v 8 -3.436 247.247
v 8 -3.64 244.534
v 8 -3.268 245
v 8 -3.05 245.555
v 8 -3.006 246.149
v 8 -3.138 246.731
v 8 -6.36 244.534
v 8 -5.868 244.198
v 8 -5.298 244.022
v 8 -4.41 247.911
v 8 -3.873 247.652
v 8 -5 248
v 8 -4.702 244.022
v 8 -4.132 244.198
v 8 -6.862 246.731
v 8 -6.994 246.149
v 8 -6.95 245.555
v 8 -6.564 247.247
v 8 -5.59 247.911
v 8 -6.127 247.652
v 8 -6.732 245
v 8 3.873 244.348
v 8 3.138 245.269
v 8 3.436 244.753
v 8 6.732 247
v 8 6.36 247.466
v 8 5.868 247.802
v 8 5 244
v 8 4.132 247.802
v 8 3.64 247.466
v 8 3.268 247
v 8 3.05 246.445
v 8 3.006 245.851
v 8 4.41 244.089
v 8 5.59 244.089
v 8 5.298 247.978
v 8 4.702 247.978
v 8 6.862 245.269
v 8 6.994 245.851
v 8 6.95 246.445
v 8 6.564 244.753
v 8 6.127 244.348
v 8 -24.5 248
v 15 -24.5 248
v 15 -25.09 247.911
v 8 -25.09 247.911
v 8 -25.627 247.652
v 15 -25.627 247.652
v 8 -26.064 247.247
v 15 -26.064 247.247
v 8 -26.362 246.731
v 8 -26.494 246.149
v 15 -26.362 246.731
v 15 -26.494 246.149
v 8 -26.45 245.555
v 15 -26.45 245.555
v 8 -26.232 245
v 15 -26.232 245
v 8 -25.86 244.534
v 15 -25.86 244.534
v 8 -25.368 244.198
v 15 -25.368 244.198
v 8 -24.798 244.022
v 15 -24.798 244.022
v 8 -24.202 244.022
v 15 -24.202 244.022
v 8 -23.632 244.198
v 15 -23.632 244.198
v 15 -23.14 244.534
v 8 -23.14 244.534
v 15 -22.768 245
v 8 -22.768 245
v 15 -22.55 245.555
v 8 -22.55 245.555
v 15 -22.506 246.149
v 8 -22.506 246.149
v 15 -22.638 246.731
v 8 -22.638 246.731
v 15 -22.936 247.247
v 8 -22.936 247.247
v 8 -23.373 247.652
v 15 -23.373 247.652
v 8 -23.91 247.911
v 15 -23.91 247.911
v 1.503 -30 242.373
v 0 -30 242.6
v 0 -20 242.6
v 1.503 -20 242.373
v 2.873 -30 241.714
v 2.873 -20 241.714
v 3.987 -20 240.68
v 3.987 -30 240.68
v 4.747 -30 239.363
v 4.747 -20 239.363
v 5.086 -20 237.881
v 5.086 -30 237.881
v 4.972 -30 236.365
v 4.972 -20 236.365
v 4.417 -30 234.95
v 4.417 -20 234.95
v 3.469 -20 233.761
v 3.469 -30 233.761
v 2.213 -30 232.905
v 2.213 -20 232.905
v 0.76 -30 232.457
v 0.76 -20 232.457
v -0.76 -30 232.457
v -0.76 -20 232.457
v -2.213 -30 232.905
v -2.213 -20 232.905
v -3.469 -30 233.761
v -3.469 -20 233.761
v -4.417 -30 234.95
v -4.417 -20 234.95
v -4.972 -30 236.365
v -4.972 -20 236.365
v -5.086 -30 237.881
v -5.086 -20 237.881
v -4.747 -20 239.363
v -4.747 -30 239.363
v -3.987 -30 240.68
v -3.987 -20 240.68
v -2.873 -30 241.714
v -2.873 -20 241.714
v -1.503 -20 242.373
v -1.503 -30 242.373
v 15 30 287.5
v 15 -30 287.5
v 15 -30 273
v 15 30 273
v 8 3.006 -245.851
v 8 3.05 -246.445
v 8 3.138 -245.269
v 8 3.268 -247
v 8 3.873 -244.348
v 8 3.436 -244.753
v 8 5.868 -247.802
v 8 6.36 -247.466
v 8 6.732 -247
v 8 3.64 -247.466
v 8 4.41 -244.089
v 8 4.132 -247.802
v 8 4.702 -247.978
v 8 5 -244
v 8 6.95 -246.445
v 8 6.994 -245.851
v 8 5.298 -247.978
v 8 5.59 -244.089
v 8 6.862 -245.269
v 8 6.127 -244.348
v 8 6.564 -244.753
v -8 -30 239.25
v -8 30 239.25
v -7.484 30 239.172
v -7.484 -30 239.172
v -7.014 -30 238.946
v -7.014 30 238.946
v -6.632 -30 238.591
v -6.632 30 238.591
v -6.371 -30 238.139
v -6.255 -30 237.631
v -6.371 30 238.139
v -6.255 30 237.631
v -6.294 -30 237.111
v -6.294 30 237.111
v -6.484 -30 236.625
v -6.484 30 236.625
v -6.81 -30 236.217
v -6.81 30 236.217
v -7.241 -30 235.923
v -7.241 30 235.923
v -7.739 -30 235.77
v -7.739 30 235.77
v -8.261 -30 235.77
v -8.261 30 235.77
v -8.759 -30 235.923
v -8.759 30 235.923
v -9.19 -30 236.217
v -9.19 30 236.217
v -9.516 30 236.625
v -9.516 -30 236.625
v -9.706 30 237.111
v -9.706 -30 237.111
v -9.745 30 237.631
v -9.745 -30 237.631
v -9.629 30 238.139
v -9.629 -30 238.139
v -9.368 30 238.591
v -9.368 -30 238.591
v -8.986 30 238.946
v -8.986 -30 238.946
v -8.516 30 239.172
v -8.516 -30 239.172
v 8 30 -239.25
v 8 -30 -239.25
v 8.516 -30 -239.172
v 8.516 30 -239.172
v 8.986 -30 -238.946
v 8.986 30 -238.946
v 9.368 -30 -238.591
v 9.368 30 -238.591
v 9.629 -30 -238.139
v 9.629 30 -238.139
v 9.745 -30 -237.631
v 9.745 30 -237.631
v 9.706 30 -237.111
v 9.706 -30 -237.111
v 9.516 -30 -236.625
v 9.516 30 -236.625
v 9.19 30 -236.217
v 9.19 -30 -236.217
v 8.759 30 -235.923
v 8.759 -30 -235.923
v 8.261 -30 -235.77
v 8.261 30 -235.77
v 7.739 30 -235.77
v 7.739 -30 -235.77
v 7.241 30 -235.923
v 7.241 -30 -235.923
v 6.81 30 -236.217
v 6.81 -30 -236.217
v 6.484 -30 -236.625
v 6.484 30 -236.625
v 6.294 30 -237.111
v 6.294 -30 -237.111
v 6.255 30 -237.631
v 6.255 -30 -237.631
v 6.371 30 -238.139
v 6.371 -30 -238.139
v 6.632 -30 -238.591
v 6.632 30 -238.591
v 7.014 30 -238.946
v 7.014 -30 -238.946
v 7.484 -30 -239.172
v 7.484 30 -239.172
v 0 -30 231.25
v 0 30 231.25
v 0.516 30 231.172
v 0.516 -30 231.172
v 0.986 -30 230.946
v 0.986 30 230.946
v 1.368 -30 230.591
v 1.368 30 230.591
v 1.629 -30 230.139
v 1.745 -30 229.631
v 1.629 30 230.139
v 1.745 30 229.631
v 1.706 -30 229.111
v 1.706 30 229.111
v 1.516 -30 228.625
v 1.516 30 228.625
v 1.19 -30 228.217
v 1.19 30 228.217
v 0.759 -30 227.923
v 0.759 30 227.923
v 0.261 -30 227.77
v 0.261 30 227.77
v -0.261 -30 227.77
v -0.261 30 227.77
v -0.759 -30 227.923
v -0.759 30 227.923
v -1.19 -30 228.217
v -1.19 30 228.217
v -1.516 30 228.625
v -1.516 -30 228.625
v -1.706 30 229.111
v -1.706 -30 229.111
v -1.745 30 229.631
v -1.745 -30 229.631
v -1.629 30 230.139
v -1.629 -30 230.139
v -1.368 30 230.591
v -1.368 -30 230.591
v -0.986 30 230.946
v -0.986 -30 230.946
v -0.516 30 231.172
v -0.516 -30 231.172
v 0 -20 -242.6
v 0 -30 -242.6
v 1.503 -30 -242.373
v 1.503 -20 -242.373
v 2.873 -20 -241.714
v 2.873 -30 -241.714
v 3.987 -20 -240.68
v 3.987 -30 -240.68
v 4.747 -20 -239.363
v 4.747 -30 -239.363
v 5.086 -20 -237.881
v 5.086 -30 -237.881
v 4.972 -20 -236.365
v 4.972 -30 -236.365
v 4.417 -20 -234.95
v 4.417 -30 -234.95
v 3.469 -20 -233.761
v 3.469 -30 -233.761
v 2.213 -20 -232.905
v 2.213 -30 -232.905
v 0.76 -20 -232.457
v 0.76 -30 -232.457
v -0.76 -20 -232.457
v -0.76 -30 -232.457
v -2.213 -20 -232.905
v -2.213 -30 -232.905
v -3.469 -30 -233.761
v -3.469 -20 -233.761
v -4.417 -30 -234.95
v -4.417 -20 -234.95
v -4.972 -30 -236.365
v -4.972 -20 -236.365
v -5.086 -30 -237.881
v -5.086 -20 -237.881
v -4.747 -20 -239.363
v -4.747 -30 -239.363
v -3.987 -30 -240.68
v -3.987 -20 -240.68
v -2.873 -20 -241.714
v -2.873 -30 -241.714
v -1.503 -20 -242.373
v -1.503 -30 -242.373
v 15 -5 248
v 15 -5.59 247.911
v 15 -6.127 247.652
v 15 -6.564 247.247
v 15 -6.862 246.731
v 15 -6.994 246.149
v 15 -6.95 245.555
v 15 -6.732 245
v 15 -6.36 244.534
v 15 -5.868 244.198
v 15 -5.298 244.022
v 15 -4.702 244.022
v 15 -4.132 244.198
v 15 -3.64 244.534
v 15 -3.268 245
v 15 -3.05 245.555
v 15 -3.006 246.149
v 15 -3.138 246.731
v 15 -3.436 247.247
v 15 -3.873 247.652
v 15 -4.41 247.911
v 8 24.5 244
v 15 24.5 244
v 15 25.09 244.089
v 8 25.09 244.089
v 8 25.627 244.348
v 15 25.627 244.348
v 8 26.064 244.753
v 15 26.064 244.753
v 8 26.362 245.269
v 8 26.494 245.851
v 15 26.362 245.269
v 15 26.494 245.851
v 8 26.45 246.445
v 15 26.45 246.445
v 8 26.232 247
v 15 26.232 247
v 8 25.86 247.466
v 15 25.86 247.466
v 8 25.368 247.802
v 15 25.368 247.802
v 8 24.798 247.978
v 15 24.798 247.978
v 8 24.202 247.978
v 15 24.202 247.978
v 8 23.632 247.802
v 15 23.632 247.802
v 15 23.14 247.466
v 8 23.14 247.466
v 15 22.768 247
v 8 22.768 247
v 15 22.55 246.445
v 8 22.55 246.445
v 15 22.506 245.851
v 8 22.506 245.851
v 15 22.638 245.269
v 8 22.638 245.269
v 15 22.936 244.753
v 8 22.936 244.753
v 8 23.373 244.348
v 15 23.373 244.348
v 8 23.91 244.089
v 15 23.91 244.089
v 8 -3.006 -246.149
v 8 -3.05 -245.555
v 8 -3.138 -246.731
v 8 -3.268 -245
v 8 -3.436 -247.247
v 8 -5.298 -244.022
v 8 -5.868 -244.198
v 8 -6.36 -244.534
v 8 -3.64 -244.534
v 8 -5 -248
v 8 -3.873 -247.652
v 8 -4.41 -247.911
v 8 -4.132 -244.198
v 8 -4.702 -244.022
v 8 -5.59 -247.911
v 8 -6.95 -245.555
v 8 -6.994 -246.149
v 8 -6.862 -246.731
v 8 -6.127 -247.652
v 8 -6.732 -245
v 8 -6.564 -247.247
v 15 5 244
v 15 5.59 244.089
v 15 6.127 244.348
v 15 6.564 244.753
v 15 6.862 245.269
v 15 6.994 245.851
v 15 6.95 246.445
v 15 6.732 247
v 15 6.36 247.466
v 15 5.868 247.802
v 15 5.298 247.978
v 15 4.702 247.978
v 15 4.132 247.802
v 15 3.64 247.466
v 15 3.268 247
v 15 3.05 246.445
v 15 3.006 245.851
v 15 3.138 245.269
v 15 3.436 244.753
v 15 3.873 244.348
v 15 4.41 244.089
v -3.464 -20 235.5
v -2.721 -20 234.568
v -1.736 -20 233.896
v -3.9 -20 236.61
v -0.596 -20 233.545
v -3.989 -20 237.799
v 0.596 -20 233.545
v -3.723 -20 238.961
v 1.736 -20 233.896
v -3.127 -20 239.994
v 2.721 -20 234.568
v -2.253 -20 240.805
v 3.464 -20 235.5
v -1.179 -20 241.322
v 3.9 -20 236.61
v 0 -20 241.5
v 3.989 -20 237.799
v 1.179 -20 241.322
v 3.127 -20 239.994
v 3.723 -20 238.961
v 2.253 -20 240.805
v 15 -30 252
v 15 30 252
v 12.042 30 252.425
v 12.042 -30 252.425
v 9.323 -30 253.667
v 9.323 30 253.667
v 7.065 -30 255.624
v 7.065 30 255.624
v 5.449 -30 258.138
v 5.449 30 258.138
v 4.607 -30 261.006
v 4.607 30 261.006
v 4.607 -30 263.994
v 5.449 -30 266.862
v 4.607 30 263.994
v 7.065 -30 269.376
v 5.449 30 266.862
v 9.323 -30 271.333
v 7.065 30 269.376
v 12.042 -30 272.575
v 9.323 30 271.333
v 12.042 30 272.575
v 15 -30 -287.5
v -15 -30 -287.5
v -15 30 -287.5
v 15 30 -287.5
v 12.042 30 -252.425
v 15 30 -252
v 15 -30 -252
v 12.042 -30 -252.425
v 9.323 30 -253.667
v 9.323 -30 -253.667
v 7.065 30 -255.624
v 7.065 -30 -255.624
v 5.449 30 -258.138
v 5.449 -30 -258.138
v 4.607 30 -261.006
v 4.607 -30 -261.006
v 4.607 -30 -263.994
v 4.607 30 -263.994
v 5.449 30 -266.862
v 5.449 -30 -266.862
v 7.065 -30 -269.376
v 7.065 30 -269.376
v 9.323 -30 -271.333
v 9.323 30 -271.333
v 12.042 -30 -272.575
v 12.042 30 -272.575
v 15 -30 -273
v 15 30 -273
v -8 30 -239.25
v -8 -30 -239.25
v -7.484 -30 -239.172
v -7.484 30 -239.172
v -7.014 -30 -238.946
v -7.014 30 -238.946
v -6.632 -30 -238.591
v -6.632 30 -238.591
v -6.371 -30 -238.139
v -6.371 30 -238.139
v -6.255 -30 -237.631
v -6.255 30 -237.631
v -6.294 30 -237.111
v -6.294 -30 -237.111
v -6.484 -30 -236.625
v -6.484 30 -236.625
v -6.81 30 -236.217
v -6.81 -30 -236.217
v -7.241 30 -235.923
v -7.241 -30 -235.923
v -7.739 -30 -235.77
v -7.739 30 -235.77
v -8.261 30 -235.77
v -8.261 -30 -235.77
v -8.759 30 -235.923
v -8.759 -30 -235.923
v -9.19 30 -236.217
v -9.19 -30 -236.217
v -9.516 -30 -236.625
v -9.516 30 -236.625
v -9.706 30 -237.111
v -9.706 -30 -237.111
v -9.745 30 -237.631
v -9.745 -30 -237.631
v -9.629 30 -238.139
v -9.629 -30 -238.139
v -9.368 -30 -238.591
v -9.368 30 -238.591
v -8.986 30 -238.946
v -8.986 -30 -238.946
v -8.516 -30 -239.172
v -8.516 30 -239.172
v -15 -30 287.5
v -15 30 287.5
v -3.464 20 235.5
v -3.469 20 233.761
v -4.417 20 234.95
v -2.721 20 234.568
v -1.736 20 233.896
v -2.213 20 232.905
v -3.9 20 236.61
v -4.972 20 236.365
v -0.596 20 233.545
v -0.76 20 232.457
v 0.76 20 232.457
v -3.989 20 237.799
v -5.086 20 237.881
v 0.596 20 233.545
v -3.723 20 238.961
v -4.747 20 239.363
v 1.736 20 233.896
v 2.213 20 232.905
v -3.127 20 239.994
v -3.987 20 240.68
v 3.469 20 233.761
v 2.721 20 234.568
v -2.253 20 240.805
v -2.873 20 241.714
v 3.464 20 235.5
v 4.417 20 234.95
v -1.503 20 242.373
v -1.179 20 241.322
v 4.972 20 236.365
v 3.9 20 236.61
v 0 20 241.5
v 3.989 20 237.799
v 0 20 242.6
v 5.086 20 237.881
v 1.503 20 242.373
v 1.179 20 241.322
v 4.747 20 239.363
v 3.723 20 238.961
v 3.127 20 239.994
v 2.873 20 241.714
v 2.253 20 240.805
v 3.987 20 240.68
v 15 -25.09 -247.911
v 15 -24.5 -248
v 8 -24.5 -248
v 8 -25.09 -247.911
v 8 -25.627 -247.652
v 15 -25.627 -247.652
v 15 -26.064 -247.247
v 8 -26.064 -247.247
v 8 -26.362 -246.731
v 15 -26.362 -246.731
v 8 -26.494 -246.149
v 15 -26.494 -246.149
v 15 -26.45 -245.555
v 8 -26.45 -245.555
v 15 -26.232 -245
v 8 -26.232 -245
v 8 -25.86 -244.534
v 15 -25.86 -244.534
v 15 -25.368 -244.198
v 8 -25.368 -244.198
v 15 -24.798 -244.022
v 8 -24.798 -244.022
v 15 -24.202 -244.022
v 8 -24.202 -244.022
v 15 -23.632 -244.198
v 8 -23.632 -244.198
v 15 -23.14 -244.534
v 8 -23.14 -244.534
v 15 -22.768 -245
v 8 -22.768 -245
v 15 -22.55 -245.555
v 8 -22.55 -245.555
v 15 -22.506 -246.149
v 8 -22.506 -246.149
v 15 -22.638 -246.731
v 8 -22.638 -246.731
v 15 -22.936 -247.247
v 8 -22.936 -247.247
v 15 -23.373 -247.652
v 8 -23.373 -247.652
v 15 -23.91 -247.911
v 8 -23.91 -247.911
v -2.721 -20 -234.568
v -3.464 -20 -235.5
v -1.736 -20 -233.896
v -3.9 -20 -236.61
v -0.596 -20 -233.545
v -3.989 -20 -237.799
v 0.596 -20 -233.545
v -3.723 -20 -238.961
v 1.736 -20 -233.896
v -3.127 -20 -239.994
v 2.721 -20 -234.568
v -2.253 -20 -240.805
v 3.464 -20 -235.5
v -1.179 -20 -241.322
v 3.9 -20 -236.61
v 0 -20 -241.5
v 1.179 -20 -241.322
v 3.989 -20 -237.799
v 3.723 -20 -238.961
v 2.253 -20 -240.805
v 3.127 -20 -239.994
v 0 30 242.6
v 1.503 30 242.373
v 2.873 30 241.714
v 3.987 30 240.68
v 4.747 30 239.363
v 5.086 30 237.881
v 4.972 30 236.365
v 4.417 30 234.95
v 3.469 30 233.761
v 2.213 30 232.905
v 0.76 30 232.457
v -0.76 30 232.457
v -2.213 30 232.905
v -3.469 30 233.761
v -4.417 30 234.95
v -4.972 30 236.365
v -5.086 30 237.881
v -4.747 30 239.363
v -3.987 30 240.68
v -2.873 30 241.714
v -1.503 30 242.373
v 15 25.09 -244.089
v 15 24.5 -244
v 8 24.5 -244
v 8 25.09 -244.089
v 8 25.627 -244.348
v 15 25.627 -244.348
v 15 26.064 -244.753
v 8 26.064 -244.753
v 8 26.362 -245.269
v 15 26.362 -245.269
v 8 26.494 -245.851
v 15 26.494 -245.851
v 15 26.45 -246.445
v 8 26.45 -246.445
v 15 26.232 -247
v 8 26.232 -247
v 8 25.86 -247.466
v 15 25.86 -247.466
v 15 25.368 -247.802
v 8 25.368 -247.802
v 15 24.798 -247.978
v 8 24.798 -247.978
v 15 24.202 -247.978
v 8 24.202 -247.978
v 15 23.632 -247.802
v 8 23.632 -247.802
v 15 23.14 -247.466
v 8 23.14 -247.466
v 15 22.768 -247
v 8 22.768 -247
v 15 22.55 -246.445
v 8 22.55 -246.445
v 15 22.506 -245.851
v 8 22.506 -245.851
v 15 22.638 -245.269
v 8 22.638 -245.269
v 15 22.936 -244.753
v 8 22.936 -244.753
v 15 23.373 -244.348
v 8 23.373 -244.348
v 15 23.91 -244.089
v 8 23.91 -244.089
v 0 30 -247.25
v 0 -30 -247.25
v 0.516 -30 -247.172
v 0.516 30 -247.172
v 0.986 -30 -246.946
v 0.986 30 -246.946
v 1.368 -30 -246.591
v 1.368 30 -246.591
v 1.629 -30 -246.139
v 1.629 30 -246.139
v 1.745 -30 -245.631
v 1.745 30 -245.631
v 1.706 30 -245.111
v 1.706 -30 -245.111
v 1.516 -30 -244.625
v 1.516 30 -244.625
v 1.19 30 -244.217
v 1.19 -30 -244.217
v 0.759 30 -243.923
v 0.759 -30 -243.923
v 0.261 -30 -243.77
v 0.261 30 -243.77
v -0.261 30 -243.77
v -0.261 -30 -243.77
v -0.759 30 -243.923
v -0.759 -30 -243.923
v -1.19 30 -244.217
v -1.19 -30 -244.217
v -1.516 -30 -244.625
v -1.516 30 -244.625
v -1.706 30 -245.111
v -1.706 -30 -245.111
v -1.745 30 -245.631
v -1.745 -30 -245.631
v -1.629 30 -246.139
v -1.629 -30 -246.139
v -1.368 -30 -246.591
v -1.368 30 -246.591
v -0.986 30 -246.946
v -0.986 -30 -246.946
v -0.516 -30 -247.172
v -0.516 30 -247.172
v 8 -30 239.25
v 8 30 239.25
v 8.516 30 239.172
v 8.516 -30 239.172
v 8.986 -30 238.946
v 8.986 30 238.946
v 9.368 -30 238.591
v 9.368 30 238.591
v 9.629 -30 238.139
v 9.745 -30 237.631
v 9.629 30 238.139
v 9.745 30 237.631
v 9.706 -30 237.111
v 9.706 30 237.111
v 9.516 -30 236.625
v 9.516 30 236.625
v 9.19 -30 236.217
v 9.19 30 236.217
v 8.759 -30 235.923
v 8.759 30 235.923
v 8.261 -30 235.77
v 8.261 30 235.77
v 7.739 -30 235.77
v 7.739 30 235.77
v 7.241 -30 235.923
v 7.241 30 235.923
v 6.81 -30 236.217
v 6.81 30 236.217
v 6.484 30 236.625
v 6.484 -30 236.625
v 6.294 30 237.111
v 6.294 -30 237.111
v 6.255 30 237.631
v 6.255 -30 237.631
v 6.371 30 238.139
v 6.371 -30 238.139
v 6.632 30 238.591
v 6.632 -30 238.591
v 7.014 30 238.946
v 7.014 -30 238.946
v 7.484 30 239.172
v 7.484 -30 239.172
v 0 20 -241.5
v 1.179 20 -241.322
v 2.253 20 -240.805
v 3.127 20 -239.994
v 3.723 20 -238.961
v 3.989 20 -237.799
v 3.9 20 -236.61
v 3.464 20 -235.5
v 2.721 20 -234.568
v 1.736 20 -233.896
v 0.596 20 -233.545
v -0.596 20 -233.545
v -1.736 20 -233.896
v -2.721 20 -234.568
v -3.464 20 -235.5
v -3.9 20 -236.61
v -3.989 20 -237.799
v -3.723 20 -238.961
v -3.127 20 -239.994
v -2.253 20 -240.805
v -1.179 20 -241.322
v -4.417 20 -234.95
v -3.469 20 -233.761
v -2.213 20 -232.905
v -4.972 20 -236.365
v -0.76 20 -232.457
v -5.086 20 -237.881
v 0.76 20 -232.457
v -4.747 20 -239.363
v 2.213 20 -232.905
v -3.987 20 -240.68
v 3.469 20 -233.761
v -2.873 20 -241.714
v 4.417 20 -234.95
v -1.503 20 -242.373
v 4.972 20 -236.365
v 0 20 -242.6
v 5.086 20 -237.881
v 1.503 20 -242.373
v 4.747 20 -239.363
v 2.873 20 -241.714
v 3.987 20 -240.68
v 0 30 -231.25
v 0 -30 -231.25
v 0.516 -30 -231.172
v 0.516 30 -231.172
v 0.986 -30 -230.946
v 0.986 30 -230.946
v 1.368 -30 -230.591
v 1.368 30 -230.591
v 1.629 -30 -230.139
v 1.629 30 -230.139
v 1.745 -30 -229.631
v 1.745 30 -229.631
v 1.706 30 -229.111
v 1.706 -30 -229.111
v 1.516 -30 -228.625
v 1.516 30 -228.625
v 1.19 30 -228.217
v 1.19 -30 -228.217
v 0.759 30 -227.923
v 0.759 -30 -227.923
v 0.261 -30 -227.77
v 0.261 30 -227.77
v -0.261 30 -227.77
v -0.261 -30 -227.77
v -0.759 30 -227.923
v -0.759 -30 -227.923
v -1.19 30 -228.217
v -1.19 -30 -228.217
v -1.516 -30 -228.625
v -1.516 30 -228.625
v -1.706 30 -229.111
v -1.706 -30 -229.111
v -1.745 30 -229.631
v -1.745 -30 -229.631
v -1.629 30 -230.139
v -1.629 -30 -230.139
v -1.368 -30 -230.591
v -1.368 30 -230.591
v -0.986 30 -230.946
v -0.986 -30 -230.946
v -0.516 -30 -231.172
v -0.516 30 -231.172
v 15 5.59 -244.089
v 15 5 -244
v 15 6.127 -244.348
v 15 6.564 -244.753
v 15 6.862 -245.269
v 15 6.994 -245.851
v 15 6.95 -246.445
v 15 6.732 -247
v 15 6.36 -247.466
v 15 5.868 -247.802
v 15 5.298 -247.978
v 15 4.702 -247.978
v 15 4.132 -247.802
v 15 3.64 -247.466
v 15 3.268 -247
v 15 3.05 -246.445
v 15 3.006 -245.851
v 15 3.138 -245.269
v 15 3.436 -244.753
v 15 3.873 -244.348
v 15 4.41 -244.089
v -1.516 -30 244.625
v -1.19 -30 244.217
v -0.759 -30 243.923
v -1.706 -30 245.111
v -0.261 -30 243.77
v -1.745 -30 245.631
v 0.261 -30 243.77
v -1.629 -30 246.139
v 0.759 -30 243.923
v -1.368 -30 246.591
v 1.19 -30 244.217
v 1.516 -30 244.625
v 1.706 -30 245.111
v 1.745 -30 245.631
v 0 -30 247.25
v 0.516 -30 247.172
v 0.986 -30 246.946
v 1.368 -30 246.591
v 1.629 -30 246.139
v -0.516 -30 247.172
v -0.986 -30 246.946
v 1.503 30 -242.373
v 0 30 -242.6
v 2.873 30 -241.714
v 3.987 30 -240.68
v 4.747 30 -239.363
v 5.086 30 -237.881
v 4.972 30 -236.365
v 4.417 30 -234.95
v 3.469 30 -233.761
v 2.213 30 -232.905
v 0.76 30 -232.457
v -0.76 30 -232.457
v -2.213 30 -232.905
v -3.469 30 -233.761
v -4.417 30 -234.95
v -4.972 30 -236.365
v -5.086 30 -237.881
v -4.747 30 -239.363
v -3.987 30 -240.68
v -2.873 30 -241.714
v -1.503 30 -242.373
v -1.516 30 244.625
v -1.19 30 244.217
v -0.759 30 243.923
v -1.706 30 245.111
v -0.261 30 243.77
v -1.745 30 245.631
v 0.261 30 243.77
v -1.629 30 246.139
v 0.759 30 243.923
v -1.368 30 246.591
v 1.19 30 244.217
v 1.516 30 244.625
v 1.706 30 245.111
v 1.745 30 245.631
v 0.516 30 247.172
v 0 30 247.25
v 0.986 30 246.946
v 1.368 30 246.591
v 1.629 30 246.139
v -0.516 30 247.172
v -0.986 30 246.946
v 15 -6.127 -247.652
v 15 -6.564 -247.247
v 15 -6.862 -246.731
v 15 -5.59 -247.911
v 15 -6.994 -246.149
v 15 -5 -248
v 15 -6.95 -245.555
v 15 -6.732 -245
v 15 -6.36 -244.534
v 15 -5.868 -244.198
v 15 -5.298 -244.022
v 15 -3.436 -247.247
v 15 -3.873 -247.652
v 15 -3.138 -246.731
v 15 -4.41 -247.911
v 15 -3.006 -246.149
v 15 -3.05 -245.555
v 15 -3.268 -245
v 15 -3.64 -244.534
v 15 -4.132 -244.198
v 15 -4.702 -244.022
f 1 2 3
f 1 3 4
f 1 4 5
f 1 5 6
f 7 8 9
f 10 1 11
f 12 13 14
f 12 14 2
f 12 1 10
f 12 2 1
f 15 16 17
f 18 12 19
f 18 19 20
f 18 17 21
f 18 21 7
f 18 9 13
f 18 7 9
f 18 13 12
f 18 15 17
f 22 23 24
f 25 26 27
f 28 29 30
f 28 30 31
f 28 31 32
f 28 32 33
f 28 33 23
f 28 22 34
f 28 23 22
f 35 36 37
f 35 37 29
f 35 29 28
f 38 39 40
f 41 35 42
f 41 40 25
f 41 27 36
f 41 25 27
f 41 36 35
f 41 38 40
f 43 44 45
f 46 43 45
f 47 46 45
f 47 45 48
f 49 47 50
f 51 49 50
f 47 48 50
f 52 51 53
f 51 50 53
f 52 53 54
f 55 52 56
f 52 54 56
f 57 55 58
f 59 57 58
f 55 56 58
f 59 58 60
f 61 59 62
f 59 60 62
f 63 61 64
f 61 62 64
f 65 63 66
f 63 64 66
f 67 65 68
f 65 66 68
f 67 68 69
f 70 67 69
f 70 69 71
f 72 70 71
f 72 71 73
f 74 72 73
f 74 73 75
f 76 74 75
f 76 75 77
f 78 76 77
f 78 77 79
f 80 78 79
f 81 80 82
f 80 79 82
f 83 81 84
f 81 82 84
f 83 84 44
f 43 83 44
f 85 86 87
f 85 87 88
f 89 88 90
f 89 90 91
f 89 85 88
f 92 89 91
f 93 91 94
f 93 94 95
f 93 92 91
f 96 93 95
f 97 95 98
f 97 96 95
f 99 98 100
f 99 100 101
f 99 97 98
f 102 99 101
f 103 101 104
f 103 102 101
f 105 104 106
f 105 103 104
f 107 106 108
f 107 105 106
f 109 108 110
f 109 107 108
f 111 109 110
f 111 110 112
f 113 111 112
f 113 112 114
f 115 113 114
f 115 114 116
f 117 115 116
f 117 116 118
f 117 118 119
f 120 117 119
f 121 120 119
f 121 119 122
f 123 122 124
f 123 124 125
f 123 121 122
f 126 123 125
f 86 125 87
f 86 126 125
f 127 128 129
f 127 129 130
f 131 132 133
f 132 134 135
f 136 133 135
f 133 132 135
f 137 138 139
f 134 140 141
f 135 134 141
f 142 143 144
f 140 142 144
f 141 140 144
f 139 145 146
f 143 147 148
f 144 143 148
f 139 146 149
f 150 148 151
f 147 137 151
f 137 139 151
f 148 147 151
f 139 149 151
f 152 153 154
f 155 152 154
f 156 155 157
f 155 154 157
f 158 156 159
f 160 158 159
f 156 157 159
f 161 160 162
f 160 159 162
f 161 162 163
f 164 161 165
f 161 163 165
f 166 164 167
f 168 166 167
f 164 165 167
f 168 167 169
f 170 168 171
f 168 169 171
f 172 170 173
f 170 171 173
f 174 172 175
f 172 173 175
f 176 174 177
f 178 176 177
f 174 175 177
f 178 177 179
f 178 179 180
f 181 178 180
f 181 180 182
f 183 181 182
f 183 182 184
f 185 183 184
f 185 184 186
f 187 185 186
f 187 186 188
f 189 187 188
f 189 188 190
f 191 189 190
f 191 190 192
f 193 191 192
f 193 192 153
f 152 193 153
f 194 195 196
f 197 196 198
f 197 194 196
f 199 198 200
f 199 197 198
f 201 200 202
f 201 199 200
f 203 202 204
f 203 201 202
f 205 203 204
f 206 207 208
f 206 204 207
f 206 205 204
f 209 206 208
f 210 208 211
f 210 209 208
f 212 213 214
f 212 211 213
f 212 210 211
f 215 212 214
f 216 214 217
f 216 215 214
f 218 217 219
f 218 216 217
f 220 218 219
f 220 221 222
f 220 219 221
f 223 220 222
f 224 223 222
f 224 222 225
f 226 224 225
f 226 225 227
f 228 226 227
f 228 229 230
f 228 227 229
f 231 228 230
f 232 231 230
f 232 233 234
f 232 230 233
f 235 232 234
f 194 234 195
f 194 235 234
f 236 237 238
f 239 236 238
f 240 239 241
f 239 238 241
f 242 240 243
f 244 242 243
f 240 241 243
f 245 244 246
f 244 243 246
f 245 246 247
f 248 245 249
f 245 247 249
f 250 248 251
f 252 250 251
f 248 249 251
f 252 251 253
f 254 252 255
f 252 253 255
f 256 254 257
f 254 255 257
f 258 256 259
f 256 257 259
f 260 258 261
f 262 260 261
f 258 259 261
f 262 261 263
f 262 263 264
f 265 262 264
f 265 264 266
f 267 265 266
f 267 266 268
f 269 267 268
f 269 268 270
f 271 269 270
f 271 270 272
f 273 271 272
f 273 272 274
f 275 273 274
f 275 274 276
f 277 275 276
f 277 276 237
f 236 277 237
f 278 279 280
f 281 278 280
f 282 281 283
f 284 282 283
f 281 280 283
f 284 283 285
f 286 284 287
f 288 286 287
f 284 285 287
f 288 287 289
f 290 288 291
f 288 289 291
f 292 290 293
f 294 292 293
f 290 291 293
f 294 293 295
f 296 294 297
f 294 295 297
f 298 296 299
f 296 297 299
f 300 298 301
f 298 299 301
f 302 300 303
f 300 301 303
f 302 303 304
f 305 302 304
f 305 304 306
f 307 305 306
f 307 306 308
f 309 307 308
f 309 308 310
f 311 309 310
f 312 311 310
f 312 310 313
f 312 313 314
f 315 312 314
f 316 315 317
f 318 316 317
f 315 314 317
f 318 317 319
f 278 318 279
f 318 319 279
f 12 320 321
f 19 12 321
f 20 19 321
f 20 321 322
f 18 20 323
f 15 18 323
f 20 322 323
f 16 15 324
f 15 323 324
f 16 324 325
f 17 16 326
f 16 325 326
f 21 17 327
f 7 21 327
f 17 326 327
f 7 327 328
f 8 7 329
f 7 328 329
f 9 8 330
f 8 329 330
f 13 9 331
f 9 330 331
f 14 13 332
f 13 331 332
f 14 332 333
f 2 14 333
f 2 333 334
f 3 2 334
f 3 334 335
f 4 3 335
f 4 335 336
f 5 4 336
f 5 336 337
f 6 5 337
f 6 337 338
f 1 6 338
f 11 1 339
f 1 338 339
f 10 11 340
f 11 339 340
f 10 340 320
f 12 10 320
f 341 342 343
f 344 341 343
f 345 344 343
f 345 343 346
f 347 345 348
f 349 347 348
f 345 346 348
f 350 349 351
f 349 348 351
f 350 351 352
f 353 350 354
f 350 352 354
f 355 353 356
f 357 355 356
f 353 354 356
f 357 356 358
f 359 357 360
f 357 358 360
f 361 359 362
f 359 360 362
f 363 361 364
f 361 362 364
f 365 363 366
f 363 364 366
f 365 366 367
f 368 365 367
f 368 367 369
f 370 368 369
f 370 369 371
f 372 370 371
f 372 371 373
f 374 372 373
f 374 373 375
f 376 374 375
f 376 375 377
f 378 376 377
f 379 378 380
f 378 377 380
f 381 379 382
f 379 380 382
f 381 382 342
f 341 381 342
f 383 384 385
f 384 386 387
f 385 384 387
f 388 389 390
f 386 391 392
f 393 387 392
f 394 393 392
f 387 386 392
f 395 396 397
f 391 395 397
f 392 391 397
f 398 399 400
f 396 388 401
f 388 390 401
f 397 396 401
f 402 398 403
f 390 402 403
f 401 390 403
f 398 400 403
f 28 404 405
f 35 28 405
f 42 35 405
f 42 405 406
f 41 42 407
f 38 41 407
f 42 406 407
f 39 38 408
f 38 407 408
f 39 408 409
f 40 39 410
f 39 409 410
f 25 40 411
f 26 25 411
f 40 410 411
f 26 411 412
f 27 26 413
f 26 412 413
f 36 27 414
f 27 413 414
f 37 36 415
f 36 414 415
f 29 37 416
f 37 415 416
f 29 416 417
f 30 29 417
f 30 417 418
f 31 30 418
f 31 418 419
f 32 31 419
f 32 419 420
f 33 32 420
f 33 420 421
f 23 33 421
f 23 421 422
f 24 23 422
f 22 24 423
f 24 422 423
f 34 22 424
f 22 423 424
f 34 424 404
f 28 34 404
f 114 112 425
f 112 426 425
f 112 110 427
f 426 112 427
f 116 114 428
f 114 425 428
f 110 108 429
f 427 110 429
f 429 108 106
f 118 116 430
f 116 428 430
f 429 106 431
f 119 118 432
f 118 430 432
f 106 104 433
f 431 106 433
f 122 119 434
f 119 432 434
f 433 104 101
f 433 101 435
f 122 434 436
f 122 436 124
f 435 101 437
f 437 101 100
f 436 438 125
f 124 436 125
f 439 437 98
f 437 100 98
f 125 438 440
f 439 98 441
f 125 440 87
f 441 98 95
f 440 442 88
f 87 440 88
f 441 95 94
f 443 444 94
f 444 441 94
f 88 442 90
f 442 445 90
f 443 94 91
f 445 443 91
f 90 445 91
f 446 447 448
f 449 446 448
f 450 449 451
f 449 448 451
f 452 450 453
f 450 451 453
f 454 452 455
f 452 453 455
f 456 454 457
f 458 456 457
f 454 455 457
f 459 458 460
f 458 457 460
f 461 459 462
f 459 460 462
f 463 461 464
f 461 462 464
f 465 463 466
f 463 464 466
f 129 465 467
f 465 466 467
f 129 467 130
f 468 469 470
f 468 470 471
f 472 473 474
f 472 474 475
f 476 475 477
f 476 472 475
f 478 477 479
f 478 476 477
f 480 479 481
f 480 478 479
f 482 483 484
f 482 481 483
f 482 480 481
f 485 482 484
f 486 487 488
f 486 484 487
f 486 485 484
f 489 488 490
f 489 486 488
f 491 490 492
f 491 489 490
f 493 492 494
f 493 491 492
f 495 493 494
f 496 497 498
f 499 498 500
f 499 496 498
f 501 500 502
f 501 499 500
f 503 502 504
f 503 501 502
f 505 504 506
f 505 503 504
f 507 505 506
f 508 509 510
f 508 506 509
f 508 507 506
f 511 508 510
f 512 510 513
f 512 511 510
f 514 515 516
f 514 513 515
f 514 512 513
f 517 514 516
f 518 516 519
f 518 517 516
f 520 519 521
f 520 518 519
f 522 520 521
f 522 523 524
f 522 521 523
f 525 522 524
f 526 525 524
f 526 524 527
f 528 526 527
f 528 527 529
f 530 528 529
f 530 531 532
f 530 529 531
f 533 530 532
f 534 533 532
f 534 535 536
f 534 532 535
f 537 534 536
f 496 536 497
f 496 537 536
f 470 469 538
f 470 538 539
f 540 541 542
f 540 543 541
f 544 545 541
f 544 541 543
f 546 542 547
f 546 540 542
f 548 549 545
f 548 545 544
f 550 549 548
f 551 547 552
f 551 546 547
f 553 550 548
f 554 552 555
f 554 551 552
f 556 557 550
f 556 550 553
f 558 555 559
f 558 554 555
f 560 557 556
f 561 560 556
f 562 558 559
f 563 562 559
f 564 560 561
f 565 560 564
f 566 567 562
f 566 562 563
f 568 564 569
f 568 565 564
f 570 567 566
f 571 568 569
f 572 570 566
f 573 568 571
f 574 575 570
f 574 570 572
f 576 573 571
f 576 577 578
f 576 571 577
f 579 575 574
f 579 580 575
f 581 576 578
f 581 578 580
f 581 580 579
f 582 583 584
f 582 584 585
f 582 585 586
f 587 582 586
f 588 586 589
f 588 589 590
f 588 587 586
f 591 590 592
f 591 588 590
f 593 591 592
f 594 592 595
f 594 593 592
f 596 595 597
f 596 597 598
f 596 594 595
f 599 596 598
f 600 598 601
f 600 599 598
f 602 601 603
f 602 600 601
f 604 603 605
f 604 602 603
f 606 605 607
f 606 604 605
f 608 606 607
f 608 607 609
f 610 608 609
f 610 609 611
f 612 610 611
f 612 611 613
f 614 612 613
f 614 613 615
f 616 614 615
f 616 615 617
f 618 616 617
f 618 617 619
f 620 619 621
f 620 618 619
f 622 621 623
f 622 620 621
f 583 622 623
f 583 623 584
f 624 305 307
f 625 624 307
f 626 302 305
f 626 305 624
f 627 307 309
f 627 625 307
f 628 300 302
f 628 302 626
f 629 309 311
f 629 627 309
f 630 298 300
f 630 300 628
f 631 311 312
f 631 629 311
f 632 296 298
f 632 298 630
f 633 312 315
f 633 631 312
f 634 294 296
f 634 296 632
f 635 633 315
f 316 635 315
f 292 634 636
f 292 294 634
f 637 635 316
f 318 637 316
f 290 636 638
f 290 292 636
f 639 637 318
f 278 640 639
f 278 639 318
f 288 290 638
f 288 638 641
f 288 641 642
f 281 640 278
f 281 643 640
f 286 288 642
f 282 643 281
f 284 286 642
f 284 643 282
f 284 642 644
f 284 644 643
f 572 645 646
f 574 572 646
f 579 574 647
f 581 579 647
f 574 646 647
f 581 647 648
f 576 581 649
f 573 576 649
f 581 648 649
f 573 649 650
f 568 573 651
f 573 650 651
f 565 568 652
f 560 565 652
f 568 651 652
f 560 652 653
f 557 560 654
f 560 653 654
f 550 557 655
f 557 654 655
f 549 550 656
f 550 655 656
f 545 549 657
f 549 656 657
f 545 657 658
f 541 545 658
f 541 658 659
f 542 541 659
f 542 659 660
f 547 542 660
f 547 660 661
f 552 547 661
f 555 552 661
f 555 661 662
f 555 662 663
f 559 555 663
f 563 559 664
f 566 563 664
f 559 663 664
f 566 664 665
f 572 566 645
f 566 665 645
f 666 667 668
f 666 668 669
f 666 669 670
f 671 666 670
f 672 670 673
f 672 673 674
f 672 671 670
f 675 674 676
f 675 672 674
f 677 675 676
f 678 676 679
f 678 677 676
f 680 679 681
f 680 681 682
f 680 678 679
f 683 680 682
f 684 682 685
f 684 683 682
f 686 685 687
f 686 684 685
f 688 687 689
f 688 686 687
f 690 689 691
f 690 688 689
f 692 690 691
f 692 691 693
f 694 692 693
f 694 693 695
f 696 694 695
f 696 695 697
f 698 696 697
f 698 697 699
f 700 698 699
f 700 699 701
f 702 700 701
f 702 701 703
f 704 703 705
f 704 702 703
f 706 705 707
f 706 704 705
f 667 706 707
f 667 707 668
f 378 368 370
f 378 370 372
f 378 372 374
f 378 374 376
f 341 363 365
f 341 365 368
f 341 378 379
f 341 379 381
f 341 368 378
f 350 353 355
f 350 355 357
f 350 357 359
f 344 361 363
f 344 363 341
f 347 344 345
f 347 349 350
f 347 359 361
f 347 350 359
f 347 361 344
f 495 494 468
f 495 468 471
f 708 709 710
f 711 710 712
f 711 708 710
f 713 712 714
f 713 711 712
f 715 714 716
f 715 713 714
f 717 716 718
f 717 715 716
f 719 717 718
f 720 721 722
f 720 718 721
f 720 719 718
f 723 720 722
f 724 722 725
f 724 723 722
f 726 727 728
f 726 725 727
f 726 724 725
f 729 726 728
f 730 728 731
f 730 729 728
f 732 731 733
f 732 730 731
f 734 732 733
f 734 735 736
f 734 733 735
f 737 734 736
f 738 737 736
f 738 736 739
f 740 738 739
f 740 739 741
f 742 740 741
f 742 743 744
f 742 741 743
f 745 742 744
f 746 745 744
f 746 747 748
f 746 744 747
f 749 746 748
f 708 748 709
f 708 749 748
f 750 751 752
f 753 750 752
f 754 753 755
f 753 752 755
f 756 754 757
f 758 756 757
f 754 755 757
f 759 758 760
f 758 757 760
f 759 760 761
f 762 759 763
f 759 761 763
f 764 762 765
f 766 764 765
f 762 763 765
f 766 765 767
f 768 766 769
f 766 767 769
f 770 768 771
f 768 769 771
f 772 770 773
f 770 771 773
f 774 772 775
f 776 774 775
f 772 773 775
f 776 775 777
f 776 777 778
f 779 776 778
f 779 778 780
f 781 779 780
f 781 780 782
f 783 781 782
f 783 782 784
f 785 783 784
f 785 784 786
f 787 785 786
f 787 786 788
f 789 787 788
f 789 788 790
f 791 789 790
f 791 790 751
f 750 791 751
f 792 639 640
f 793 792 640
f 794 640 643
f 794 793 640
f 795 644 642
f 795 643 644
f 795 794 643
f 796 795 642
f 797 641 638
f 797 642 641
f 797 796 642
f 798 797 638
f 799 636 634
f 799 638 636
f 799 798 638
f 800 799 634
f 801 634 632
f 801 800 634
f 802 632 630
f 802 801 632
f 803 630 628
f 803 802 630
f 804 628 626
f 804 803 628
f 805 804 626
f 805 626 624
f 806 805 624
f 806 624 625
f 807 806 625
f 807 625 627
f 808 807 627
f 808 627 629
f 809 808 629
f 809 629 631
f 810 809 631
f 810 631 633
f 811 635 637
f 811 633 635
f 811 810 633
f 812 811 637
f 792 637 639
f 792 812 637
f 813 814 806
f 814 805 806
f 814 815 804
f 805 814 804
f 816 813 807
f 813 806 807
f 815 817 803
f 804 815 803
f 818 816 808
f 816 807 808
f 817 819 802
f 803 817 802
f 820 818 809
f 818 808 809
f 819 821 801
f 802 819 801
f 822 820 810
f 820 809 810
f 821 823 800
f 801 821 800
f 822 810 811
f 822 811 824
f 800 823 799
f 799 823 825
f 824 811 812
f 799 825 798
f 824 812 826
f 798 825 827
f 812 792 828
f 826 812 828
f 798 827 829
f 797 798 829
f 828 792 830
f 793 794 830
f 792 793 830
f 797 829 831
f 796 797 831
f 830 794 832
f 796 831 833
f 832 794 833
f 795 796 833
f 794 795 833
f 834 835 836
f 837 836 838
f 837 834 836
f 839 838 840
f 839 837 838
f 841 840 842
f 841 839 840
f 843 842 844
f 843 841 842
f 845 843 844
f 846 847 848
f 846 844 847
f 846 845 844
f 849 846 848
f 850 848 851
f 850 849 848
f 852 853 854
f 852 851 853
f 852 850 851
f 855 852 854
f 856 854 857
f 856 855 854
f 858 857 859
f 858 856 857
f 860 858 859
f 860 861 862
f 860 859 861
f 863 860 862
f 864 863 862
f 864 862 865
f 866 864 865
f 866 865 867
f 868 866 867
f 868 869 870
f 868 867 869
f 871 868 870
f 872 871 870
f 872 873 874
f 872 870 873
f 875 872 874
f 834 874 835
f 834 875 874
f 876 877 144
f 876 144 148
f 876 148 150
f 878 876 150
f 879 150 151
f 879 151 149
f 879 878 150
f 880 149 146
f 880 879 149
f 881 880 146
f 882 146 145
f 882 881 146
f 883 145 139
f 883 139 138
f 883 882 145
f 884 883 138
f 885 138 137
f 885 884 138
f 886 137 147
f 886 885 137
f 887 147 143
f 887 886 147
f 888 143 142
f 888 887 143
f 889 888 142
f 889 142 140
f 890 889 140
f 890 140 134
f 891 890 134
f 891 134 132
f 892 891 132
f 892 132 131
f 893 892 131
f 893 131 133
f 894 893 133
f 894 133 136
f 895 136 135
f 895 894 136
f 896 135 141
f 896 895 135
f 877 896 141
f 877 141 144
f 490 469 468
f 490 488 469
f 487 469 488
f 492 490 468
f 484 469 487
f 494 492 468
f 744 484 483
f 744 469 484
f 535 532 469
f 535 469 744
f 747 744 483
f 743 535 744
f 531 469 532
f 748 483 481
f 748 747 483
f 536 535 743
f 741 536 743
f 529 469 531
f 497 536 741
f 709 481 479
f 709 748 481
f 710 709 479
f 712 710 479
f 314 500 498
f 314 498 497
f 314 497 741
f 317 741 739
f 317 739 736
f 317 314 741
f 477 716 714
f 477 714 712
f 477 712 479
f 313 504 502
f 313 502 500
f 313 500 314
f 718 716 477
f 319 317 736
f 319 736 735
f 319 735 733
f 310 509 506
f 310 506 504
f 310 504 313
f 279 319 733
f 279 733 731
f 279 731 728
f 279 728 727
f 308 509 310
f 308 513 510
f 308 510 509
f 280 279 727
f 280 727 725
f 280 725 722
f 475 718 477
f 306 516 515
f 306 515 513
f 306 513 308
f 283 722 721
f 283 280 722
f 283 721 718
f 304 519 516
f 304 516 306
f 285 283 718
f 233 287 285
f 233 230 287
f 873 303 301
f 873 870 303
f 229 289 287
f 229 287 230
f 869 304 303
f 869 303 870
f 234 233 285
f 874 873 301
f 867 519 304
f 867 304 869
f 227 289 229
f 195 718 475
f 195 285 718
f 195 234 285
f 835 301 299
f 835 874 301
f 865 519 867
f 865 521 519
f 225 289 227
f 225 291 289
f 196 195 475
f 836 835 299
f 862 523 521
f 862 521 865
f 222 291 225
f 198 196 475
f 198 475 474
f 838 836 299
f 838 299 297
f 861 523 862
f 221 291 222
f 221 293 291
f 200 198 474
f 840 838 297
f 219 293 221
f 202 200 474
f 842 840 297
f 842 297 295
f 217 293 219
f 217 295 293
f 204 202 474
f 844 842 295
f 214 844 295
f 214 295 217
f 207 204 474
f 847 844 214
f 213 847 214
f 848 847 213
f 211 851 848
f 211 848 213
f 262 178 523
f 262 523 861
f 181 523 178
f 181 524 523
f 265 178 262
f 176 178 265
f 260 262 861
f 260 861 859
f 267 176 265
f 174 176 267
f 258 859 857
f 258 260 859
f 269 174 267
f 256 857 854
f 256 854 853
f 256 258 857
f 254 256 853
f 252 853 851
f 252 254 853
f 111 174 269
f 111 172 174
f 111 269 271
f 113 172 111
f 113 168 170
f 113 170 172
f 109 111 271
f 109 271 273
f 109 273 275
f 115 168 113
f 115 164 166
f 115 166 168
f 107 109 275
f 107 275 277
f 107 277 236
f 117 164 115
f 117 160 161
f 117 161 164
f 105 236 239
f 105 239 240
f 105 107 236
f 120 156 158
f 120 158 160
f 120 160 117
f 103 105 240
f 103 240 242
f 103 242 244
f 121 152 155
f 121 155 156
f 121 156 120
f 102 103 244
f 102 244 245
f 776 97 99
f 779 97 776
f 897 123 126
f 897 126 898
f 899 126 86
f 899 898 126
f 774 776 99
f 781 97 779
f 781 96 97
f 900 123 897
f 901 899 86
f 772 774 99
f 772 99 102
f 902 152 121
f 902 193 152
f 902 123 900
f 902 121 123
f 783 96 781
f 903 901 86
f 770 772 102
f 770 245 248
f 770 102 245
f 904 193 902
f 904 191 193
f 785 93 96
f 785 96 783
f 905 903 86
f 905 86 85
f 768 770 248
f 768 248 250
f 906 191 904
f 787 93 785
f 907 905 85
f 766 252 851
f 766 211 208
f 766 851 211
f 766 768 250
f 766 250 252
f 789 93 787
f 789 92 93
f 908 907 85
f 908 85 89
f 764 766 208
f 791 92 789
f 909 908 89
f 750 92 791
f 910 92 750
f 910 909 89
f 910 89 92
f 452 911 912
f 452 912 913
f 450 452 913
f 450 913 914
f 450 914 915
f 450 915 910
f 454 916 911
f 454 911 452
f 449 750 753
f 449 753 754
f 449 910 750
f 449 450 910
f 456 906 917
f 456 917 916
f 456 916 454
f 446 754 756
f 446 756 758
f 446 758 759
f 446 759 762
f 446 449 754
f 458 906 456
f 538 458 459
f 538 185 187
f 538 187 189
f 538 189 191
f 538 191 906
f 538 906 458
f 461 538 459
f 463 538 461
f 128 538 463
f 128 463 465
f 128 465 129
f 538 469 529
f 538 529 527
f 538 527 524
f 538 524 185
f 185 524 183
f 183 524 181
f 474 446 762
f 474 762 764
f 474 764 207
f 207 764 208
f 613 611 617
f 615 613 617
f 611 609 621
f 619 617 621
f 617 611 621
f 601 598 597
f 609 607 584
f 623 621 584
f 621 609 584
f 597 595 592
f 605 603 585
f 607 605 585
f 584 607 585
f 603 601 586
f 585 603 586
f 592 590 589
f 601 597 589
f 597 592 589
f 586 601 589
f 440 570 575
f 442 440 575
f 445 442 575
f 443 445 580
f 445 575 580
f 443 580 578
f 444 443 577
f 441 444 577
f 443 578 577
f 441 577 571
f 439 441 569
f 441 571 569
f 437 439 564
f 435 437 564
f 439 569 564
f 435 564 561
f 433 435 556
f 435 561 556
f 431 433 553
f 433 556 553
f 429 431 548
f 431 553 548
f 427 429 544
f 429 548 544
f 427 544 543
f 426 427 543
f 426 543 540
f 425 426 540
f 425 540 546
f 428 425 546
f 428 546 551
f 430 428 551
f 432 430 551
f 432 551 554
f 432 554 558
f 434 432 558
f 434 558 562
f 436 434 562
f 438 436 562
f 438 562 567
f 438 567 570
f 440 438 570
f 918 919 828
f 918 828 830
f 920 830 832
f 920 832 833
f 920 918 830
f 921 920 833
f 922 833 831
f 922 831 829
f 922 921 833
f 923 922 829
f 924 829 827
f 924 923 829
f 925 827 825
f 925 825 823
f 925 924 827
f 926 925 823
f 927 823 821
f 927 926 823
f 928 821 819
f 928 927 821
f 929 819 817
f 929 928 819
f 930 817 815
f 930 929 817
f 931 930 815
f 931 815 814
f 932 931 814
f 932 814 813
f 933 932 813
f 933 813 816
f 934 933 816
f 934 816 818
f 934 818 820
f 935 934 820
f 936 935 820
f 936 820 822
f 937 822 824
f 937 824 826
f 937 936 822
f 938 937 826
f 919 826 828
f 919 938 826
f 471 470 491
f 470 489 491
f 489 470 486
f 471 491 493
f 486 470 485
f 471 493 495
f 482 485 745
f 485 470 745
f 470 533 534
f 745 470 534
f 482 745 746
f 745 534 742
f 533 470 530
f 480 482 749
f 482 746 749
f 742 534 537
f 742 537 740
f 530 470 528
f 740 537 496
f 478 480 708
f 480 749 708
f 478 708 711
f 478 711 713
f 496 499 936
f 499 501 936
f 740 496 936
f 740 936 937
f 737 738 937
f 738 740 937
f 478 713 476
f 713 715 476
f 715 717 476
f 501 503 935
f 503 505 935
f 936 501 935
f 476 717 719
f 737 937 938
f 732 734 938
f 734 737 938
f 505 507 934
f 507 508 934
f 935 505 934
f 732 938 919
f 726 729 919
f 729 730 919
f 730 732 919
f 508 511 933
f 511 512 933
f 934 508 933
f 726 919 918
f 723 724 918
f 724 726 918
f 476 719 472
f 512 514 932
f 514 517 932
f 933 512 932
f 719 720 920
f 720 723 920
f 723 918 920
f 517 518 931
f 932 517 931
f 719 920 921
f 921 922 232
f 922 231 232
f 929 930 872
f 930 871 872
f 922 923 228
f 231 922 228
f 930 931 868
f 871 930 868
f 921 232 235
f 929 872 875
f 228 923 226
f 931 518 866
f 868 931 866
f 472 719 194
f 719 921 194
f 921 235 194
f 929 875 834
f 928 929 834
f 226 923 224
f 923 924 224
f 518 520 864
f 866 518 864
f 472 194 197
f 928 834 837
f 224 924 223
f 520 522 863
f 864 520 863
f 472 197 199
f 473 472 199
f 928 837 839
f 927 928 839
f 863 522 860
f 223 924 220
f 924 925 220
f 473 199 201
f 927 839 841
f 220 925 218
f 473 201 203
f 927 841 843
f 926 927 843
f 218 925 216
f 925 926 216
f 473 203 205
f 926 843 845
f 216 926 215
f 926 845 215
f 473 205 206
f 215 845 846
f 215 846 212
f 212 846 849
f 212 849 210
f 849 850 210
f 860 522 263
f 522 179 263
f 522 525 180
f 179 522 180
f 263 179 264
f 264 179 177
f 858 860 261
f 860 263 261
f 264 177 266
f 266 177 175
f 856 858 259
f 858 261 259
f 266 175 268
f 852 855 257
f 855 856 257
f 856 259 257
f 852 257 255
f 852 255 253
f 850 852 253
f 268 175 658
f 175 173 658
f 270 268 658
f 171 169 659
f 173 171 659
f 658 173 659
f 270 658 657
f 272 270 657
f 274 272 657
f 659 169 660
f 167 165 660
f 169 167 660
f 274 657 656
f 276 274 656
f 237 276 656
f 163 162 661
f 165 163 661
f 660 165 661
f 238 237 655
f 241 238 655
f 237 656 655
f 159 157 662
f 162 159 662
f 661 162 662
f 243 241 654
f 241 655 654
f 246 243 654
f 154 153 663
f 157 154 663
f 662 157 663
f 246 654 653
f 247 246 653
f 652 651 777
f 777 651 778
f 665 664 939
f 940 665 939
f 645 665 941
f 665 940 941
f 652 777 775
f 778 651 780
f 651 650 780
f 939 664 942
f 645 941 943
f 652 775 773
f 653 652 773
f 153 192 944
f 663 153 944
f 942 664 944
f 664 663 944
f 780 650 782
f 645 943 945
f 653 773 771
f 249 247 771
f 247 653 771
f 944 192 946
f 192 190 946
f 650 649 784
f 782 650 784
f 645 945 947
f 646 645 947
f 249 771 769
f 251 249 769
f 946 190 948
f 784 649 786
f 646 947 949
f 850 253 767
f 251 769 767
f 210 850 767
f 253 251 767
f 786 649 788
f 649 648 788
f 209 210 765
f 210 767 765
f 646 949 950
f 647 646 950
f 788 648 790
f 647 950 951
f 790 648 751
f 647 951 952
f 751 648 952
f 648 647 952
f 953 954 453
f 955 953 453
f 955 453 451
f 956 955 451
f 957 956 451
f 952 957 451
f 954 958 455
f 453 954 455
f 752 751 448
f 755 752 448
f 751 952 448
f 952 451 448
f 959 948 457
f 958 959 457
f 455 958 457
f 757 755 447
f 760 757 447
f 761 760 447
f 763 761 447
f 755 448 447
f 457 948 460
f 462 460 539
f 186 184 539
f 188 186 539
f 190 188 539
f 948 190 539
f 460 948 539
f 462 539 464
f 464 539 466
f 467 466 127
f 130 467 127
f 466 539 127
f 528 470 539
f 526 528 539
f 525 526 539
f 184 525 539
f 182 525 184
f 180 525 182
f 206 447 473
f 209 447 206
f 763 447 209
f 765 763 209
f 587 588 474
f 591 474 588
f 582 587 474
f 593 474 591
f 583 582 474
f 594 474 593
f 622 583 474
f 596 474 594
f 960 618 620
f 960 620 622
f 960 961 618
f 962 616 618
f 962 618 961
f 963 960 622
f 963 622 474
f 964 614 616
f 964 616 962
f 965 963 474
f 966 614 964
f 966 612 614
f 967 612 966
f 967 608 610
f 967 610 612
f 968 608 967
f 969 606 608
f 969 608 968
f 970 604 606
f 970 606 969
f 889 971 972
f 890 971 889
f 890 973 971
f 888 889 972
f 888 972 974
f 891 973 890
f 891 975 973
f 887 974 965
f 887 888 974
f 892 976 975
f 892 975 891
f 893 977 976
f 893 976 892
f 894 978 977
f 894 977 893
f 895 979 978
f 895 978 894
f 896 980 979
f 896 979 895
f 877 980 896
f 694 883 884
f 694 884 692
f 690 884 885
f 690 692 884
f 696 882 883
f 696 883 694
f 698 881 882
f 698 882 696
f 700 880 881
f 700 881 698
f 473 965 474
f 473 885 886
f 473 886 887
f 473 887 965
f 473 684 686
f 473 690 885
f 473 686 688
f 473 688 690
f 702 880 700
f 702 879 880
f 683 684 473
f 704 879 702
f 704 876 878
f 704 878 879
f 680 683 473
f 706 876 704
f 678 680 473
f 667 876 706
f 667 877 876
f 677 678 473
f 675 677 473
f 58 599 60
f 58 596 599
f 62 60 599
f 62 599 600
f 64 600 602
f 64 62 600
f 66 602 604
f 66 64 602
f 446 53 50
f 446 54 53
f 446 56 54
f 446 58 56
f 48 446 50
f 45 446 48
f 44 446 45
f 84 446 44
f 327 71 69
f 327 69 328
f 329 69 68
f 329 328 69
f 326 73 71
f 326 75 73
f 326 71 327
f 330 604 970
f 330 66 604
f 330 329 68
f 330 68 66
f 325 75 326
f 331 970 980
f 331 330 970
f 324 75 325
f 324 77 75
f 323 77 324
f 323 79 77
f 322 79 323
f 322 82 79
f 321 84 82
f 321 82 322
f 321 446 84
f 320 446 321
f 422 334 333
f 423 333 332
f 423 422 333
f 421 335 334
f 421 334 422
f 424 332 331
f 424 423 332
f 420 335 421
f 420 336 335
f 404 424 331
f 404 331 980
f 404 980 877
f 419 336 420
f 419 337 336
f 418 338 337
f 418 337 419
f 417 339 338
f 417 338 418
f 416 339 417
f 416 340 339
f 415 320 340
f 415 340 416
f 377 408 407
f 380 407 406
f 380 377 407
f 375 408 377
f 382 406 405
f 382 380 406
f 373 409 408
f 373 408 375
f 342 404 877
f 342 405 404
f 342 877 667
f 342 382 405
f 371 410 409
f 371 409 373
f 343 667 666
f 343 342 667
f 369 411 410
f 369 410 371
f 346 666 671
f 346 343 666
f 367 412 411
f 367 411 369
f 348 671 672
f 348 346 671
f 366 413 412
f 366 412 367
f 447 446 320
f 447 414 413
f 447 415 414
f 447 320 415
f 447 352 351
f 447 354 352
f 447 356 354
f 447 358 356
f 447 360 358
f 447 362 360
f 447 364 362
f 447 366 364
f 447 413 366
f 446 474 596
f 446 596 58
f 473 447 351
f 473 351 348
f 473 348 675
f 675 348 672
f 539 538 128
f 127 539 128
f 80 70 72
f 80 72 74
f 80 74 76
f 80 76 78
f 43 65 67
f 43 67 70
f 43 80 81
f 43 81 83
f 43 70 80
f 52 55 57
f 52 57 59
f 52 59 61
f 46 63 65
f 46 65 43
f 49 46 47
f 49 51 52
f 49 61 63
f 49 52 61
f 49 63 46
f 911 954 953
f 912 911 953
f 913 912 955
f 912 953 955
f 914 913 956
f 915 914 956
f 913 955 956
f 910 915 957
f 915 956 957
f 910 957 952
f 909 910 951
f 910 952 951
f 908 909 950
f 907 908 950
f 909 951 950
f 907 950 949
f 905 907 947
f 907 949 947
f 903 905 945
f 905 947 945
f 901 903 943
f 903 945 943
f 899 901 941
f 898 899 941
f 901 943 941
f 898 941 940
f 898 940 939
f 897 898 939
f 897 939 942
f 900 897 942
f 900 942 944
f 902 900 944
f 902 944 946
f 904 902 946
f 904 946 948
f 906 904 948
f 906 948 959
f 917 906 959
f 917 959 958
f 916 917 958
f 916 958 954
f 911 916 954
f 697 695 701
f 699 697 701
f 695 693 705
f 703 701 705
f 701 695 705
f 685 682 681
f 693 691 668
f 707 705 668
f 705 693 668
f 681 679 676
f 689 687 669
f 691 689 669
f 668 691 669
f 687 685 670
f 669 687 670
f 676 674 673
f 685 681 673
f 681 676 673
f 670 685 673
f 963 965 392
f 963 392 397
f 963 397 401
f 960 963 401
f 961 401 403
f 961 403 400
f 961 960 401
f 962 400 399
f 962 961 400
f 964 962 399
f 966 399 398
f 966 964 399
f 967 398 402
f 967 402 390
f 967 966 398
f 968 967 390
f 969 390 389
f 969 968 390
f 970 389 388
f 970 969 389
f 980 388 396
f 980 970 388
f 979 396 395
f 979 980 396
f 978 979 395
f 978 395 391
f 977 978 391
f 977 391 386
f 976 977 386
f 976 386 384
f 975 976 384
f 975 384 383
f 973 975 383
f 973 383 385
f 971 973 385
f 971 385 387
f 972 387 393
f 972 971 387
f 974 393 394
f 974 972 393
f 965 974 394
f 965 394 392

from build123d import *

# Parameters (mm, degrees)
SKETCH1_W               = 30
SKETCH1_H               = 60
BOSS_EXTRUDE1_DEPTH     = 287.5
SKETCH2_R               = 10.5
CUT_EXTRUDE1_DEPTH      = 295.076945713
SKETCH3_R               = 5.1
CUT_EXTRUDE2_DEPTH      = 10
SKETCH4_R               = 4
SKETCH4_R_2             = 1.75
CUT_EXTRUDE3_DEPTH      = 295.076945713
SKETCH5_R               = 2
CUT_EXTRUDE4_DEPTH      = 7
MIRROR1_COPY_1_SKETCH_R = 5.1
MIRROR1_COPY_1_DEPTH    = 10


with BuildPart() as part:
    # Sketch1 → Boss-Extrude1 (new, symmetric)
    with BuildSketch(Plane.XY):
        Rectangle(SKETCH1_W, SKETCH1_H)
    extrude(amount=BOSS_EXTRUDE1_DEPTH, both=True)

    # Sketch2 → Cut-Extrude1 (cut, through all)
    with BuildSketch(Plane(origin=(0, 30, 0), x_dir=(1, 0, 0), z_dir=(0, 1, 0))):
        with Locations((15, -262.5)):
            Circle(SKETCH2_R)
    cut_extrude1 = extrude(amount=-CUT_EXTRUDE1_DEPTH, mode=Mode.SUBTRACT)

    # Sketch3 → Cut-Extrude2 (cut)
    with BuildSketch(Plane(origin=(0, 30, 0), x_dir=(1, 0, 0), z_dir=(0, 1, 0))):
        with Locations(Location((0, -237.5, 0), (0, 0, 270))):
            Circle(SKETCH3_R)
    cut_extrude2 = extrude(amount=-CUT_EXTRUDE2_DEPTH, mode=Mode.SUBTRACT)

    # Mirror2: Cut-Extrude2 across plane
    add(cut_extrude2.mirror(Plane.ZX), mode=Mode.SUBTRACT)

    # Sketch4 → Cut-Extrude3 (cut, through all)
    with BuildSketch(Plane(origin=(0, 30, 0), x_dir=(1, 0, 0), z_dir=(0, 1, 0))):
        with Locations(Location((0, -237.5, 0), (0, 0, 270))):
            Circle(SKETCH4_R)
        with Locations(Location((-8, -237.5, 0), (0, 0, 270))):
            Circle(SKETCH4_R_2)
        with Locations(Location((0, -229.5, 0), (0, 0, 270))):
            Circle(SKETCH4_R_2)
        with Locations(Location((8, -237.5, 0), (0, 0, 270))):
            Circle(SKETCH4_R_2)
        with Locations(Location((0, -245.5, 0), (0, 0, 270))):
            Circle(SKETCH4_R_2)
    cut_extrude3 = extrude(amount=-CUT_EXTRUDE3_DEPTH, mode=Mode.SUBTRACT)

    # Sketch5 → Cut-Extrude4 (cut)
    with BuildSketch(Plane(origin=(15, 0, 0), x_dir=(0, 0, -1), z_dir=(1, 0, 0))):
        with Locations((-246, 24.5)):
            Circle(SKETCH5_R)
        with Locations((-246, 5)):
            Circle(SKETCH5_R)
        with Locations(Location((-246, -5, 0), (0, 0, 180))):
            Circle(SKETCH5_R)
        with Locations(Location((-246, -24.5, 0), (0, 0, 180))):
            Circle(SKETCH5_R)
    cut_extrude4 = extrude(amount=-CUT_EXTRUDE4_DEPTH, mode=Mode.SUBTRACT)

    # Mirror1: Cut-Extrude1, Cut-Extrude2, Cut-Extrude3, Cut-Extrude4 across plane
    add(cut_extrude1.mirror(Plane.XY), mode=Mode.SUBTRACT)
    add(cut_extrude2.mirror(Plane.XY), mode=Mode.SUBTRACT)
    add(cut_extrude3.mirror(Plane.XY), mode=Mode.SUBTRACT)
    add(cut_extrude4.mirror(Plane.XY), mode=Mode.SUBTRACT)

    # Mirror1 copy 1 sketch → Mirror1 copy 1 (cut)
    with BuildSketch(Plane.XZ.offset(30)):
        with Locations(Location((0, -237.5, 0), (0, 0, 270))):
            Circle(MIRROR1_COPY_1_SKETCH_R)
    extrude(amount=-MIRROR1_COPY_1_DEPTH, mode=Mode.SUBTRACT)


solid = part.part
